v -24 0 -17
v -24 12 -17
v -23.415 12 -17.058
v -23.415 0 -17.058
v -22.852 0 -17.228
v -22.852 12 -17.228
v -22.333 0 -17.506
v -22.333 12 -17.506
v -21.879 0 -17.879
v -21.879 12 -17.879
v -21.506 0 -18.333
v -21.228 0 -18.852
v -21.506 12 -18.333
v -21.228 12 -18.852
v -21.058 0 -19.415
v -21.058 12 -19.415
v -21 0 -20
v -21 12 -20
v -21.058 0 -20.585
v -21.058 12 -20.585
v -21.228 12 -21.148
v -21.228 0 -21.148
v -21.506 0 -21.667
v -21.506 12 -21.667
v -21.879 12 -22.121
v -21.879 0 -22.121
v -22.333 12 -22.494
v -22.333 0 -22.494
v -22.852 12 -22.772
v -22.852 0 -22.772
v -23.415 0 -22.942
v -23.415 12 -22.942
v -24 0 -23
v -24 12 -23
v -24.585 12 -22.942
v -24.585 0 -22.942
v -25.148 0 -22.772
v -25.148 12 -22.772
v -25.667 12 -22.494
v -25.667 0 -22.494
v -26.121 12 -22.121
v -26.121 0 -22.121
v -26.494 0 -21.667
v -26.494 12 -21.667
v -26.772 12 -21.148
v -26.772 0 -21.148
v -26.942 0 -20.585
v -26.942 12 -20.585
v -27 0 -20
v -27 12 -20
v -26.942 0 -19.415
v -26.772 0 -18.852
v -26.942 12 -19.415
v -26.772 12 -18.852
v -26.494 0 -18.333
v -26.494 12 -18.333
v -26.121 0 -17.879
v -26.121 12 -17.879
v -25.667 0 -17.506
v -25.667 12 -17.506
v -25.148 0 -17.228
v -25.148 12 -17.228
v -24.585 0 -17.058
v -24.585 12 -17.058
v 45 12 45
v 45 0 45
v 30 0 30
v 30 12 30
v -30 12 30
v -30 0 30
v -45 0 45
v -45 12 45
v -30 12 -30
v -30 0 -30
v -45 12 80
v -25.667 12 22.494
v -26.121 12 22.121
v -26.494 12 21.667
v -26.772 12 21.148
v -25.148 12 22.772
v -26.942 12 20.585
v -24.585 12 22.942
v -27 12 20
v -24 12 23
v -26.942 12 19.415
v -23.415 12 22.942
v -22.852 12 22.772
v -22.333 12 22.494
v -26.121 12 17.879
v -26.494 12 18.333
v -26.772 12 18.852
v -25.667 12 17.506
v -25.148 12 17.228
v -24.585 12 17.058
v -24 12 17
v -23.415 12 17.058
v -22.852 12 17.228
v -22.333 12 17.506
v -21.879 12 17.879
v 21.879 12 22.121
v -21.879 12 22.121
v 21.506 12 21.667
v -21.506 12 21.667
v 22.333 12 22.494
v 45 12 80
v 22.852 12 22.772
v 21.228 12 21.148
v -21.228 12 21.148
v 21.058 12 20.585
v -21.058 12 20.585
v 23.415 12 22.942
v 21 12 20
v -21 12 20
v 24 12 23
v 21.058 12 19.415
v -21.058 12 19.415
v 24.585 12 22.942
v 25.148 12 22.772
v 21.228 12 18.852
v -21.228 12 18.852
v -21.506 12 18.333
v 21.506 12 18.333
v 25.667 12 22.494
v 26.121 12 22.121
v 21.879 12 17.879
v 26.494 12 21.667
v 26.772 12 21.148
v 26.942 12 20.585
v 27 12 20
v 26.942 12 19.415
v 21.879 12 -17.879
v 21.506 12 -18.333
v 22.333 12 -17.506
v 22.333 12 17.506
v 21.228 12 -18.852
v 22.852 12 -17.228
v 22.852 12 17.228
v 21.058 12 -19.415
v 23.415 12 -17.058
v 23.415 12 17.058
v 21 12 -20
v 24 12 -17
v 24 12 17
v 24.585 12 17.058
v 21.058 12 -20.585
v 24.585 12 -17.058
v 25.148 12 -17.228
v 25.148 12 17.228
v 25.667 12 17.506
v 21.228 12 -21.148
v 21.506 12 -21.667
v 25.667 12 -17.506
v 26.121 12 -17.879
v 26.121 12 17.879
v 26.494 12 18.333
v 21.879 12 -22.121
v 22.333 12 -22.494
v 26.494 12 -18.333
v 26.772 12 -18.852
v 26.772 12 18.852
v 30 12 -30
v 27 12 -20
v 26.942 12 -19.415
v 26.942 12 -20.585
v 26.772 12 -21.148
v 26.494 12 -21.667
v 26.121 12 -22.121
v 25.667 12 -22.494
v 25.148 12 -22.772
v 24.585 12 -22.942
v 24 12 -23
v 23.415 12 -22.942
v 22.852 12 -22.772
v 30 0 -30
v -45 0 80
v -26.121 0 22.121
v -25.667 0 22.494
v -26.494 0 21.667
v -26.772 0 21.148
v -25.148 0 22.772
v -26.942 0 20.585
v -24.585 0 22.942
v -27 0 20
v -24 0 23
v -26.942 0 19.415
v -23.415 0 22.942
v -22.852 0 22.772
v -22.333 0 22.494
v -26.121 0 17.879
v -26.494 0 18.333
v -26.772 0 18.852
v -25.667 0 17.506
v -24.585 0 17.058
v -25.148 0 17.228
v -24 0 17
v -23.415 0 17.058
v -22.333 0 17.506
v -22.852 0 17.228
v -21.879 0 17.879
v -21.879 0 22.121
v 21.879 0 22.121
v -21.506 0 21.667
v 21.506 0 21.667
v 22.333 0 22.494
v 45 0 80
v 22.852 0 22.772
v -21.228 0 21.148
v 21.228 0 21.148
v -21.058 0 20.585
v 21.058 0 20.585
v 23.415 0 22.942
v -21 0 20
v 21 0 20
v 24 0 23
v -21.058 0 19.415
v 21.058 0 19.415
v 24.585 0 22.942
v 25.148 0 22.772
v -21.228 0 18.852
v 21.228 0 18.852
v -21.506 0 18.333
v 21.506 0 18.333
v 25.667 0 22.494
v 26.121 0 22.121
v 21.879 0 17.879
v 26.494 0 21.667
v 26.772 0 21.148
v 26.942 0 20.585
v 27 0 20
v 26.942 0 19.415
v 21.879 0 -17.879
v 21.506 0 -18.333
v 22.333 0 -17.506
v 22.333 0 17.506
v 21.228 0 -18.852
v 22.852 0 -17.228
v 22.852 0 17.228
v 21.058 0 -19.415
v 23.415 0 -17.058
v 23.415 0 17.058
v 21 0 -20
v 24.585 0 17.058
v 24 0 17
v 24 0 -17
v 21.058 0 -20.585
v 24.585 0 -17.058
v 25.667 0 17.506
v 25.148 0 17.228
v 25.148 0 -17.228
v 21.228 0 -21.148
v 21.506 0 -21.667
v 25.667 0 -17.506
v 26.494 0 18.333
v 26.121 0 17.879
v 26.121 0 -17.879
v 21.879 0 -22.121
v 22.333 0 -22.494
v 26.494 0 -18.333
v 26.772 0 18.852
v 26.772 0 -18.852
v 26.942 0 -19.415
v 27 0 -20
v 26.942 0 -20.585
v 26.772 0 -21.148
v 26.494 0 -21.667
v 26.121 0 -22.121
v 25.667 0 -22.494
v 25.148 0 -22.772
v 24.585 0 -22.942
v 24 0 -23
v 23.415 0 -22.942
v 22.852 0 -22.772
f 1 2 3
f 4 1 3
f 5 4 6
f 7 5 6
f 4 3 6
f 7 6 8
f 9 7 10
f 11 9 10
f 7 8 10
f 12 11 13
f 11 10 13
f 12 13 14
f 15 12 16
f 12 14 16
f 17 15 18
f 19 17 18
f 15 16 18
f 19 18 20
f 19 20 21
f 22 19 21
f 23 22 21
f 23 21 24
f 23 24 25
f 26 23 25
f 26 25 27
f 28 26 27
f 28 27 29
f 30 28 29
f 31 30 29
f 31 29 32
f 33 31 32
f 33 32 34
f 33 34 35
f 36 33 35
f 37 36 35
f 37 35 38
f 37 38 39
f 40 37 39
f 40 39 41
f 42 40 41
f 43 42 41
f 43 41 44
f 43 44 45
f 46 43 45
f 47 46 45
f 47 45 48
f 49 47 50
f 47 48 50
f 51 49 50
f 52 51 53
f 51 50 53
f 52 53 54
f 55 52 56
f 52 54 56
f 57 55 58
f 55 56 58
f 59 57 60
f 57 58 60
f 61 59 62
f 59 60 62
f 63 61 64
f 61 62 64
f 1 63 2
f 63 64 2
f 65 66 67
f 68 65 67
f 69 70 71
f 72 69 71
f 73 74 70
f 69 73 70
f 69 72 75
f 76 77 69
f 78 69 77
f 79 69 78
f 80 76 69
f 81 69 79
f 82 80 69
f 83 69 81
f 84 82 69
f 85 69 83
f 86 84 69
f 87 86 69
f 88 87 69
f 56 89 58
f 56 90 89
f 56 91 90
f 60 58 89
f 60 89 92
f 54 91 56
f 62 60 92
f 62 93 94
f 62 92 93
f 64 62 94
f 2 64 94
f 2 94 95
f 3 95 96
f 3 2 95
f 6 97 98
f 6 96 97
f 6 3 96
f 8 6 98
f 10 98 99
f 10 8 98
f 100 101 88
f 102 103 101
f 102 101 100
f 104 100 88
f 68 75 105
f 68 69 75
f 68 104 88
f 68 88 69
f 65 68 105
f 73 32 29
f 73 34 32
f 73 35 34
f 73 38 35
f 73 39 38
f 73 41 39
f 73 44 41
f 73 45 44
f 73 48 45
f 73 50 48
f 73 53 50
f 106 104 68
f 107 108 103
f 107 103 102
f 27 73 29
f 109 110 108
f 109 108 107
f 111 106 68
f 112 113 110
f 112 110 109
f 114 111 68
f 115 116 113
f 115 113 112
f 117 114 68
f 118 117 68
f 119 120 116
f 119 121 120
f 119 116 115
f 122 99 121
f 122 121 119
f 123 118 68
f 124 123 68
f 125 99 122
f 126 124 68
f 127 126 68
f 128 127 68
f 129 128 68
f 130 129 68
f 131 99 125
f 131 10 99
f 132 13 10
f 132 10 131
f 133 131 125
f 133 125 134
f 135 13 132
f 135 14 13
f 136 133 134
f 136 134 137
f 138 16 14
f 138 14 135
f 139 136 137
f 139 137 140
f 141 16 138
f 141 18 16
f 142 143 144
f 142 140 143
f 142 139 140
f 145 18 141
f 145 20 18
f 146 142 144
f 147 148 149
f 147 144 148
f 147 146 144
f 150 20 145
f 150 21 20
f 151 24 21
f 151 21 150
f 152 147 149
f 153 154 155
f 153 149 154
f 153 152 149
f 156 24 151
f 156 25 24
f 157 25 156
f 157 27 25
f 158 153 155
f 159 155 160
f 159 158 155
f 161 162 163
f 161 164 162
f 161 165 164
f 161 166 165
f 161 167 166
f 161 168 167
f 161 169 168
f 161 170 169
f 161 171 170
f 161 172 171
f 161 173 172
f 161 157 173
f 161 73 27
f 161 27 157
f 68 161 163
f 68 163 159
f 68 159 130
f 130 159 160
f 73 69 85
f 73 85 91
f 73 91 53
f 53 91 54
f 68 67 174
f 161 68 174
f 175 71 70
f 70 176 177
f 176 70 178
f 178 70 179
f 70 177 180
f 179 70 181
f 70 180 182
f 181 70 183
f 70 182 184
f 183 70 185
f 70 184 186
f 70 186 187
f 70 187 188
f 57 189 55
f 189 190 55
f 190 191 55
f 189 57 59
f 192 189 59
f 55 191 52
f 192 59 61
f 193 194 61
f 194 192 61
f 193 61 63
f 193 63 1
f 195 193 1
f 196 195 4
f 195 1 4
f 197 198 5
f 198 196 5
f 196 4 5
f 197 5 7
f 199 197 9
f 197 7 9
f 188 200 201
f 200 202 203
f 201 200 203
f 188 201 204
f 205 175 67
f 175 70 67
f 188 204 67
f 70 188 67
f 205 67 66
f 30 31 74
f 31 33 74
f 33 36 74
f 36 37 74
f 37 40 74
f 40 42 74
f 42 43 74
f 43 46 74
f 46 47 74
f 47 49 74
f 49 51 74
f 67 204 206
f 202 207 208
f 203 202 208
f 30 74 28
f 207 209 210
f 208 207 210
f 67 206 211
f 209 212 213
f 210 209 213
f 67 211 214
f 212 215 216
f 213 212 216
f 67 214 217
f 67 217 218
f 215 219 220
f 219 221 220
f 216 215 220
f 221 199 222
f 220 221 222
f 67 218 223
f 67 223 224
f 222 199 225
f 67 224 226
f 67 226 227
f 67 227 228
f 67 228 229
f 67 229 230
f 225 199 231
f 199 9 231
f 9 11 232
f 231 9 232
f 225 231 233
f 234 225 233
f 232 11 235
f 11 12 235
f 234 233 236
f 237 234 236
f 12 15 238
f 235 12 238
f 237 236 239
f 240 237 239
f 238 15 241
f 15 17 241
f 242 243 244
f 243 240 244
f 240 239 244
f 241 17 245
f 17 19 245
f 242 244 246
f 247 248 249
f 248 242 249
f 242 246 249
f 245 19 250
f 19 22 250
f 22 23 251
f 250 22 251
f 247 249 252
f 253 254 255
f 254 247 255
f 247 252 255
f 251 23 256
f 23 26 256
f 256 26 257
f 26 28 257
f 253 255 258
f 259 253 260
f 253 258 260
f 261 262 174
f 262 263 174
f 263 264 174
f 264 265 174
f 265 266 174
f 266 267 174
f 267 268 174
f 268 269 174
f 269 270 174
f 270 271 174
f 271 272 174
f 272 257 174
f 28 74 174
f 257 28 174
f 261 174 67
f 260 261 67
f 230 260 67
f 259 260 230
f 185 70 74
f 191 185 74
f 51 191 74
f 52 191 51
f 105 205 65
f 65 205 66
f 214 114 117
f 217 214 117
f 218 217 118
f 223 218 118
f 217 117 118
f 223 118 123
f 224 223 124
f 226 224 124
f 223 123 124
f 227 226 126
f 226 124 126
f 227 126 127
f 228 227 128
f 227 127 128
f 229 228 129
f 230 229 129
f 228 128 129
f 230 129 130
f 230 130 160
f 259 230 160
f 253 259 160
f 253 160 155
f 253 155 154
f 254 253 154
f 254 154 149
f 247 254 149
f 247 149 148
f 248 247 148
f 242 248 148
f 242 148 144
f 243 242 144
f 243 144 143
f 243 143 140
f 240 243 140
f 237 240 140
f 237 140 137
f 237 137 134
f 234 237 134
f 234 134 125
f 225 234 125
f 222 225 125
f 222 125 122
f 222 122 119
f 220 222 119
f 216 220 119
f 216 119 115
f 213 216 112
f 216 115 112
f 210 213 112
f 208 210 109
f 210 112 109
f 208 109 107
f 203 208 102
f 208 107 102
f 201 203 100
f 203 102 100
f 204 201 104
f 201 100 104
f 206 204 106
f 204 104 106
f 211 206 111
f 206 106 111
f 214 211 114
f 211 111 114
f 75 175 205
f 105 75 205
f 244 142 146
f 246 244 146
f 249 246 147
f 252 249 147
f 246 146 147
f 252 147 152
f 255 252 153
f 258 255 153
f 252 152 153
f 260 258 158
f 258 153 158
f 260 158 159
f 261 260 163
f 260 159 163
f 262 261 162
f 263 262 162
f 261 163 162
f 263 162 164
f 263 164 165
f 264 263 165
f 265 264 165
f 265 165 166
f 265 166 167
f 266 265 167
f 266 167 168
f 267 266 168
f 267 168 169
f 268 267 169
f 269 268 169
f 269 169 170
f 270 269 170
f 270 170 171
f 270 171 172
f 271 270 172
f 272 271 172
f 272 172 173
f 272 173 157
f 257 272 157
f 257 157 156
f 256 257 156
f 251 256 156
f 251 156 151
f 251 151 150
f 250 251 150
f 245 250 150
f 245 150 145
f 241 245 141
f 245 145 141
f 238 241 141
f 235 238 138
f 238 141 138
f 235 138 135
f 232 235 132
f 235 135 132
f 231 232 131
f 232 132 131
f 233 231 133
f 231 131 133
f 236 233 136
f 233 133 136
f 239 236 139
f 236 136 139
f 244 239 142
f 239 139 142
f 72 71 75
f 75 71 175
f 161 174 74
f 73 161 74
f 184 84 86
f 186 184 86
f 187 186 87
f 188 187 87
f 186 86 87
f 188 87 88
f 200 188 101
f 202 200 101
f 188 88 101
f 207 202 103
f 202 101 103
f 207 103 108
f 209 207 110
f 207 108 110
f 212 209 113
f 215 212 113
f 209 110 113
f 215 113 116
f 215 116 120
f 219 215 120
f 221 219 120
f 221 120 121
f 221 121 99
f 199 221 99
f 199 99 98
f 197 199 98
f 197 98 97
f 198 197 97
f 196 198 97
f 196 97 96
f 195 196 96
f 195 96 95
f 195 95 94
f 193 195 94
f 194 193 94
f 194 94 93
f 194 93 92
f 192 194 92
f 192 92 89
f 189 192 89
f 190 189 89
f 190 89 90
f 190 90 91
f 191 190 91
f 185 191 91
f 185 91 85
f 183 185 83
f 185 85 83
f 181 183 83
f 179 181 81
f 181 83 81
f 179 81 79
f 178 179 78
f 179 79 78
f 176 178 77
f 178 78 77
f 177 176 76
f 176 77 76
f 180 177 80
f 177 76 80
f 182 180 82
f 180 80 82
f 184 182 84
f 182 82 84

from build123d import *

# Parameters (mm, degrees)
BOSS_EXTRUDE1_DEPTH = 12
CUT_EXTRUDE1_REACH  = 94.569
SKETCH2_R           = 3


with BuildPart() as part:
    # Sketch1 → Boss-Extrude1 (new body)
    with BuildSketch(Plane(origin=(0, 0, 0), x_dir=(1, 0, 0), z_dir=(0, 1, 0))):
        Polygon((-30, -30), (-45, -45), (-45, -80), (45, -80), (45, -45), (30, -30), (30, 30), (-30, 30), align=None)
    extrude(amount=BOSS_EXTRUDE1_DEPTH)

    # Sketch2 → Cut-Extrude1 (cut, up to next)
    with BuildSketch(Plane(origin=(0, 12, 0), x_dir=(1, 0, 0), z_dir=(0, 1, 0)), mode=Mode.PRIVATE) as cut_extrude1_sk1:
        with Locations(Location((-24, 20, 0), (0, 0, 270))):
            Circle(SKETCH2_R)
    cut_extrude1_tool1 = extrude(cut_extrude1_sk1.sketch, amount=-CUT_EXTRUDE1_REACH, mode=Mode.PRIVATE) & part.part
    # Sketch2 → Cut-Extrude1 (cut, up to next)
    with BuildSketch(Plane(origin=(0, 12, 0), x_dir=(1, 0, 0), z_dir=(0, 1, 0)), mode=Mode.PRIVATE) as cut_extrude1_sk2:
        with Locations(Location((-24, -20, 0), (0, 0, 270))):
            Circle(SKETCH2_R)
    cut_extrude1_tool2 = extrude(cut_extrude1_sk2.sketch, amount=-CUT_EXTRUDE1_REACH, mode=Mode.PRIVATE) & part.part
    # Sketch2 → Cut-Extrude1 (cut, up to next)
    with BuildSketch(Plane(origin=(0, 12, 0), x_dir=(1, 0, 0), z_dir=(0, 1, 0)), mode=Mode.PRIVATE) as cut_extrude1_sk3:
        with Locations(Location((24, 20, 0), (0, 0, 270))):
            Circle(SKETCH2_R)
    cut_extrude1_tool3 = extrude(cut_extrude1_sk3.sketch, amount=-CUT_EXTRUDE1_REACH, mode=Mode.PRIVATE) & part.part
    # Sketch2 → Cut-Extrude1 (cut, up to next)
    with BuildSketch(Plane(origin=(0, 12, 0), x_dir=(1, 0, 0), z_dir=(0, 1, 0)), mode=Mode.PRIVATE) as cut_extrude1_sk4:
        with Locations(Location((24, -20, 0), (0, 0, 270))):
            Circle(SKETCH2_R)
    cut_extrude1_tool4 = extrude(cut_extrude1_sk4.sketch, amount=-CUT_EXTRUDE1_REACH, mode=Mode.PRIVATE) & part.part
    add(cut_extrude1_tool1.solids().sort_by_distance((-24, 12, -20))[0], mode=Mode.SUBTRACT)
    add(cut_extrude1_tool2.solids().sort_by_distance((-24, 12, 20))[0], mode=Mode.SUBTRACT)
    add(cut_extrude1_tool3.solids().sort_by_distance((24, 12, -20))[0], mode=Mode.SUBTRACT)
    add(cut_extrude1_tool4.solids().sort_by_distance((24, 12, 20))[0], mode=Mode.SUBTRACT)


solid = part.part
